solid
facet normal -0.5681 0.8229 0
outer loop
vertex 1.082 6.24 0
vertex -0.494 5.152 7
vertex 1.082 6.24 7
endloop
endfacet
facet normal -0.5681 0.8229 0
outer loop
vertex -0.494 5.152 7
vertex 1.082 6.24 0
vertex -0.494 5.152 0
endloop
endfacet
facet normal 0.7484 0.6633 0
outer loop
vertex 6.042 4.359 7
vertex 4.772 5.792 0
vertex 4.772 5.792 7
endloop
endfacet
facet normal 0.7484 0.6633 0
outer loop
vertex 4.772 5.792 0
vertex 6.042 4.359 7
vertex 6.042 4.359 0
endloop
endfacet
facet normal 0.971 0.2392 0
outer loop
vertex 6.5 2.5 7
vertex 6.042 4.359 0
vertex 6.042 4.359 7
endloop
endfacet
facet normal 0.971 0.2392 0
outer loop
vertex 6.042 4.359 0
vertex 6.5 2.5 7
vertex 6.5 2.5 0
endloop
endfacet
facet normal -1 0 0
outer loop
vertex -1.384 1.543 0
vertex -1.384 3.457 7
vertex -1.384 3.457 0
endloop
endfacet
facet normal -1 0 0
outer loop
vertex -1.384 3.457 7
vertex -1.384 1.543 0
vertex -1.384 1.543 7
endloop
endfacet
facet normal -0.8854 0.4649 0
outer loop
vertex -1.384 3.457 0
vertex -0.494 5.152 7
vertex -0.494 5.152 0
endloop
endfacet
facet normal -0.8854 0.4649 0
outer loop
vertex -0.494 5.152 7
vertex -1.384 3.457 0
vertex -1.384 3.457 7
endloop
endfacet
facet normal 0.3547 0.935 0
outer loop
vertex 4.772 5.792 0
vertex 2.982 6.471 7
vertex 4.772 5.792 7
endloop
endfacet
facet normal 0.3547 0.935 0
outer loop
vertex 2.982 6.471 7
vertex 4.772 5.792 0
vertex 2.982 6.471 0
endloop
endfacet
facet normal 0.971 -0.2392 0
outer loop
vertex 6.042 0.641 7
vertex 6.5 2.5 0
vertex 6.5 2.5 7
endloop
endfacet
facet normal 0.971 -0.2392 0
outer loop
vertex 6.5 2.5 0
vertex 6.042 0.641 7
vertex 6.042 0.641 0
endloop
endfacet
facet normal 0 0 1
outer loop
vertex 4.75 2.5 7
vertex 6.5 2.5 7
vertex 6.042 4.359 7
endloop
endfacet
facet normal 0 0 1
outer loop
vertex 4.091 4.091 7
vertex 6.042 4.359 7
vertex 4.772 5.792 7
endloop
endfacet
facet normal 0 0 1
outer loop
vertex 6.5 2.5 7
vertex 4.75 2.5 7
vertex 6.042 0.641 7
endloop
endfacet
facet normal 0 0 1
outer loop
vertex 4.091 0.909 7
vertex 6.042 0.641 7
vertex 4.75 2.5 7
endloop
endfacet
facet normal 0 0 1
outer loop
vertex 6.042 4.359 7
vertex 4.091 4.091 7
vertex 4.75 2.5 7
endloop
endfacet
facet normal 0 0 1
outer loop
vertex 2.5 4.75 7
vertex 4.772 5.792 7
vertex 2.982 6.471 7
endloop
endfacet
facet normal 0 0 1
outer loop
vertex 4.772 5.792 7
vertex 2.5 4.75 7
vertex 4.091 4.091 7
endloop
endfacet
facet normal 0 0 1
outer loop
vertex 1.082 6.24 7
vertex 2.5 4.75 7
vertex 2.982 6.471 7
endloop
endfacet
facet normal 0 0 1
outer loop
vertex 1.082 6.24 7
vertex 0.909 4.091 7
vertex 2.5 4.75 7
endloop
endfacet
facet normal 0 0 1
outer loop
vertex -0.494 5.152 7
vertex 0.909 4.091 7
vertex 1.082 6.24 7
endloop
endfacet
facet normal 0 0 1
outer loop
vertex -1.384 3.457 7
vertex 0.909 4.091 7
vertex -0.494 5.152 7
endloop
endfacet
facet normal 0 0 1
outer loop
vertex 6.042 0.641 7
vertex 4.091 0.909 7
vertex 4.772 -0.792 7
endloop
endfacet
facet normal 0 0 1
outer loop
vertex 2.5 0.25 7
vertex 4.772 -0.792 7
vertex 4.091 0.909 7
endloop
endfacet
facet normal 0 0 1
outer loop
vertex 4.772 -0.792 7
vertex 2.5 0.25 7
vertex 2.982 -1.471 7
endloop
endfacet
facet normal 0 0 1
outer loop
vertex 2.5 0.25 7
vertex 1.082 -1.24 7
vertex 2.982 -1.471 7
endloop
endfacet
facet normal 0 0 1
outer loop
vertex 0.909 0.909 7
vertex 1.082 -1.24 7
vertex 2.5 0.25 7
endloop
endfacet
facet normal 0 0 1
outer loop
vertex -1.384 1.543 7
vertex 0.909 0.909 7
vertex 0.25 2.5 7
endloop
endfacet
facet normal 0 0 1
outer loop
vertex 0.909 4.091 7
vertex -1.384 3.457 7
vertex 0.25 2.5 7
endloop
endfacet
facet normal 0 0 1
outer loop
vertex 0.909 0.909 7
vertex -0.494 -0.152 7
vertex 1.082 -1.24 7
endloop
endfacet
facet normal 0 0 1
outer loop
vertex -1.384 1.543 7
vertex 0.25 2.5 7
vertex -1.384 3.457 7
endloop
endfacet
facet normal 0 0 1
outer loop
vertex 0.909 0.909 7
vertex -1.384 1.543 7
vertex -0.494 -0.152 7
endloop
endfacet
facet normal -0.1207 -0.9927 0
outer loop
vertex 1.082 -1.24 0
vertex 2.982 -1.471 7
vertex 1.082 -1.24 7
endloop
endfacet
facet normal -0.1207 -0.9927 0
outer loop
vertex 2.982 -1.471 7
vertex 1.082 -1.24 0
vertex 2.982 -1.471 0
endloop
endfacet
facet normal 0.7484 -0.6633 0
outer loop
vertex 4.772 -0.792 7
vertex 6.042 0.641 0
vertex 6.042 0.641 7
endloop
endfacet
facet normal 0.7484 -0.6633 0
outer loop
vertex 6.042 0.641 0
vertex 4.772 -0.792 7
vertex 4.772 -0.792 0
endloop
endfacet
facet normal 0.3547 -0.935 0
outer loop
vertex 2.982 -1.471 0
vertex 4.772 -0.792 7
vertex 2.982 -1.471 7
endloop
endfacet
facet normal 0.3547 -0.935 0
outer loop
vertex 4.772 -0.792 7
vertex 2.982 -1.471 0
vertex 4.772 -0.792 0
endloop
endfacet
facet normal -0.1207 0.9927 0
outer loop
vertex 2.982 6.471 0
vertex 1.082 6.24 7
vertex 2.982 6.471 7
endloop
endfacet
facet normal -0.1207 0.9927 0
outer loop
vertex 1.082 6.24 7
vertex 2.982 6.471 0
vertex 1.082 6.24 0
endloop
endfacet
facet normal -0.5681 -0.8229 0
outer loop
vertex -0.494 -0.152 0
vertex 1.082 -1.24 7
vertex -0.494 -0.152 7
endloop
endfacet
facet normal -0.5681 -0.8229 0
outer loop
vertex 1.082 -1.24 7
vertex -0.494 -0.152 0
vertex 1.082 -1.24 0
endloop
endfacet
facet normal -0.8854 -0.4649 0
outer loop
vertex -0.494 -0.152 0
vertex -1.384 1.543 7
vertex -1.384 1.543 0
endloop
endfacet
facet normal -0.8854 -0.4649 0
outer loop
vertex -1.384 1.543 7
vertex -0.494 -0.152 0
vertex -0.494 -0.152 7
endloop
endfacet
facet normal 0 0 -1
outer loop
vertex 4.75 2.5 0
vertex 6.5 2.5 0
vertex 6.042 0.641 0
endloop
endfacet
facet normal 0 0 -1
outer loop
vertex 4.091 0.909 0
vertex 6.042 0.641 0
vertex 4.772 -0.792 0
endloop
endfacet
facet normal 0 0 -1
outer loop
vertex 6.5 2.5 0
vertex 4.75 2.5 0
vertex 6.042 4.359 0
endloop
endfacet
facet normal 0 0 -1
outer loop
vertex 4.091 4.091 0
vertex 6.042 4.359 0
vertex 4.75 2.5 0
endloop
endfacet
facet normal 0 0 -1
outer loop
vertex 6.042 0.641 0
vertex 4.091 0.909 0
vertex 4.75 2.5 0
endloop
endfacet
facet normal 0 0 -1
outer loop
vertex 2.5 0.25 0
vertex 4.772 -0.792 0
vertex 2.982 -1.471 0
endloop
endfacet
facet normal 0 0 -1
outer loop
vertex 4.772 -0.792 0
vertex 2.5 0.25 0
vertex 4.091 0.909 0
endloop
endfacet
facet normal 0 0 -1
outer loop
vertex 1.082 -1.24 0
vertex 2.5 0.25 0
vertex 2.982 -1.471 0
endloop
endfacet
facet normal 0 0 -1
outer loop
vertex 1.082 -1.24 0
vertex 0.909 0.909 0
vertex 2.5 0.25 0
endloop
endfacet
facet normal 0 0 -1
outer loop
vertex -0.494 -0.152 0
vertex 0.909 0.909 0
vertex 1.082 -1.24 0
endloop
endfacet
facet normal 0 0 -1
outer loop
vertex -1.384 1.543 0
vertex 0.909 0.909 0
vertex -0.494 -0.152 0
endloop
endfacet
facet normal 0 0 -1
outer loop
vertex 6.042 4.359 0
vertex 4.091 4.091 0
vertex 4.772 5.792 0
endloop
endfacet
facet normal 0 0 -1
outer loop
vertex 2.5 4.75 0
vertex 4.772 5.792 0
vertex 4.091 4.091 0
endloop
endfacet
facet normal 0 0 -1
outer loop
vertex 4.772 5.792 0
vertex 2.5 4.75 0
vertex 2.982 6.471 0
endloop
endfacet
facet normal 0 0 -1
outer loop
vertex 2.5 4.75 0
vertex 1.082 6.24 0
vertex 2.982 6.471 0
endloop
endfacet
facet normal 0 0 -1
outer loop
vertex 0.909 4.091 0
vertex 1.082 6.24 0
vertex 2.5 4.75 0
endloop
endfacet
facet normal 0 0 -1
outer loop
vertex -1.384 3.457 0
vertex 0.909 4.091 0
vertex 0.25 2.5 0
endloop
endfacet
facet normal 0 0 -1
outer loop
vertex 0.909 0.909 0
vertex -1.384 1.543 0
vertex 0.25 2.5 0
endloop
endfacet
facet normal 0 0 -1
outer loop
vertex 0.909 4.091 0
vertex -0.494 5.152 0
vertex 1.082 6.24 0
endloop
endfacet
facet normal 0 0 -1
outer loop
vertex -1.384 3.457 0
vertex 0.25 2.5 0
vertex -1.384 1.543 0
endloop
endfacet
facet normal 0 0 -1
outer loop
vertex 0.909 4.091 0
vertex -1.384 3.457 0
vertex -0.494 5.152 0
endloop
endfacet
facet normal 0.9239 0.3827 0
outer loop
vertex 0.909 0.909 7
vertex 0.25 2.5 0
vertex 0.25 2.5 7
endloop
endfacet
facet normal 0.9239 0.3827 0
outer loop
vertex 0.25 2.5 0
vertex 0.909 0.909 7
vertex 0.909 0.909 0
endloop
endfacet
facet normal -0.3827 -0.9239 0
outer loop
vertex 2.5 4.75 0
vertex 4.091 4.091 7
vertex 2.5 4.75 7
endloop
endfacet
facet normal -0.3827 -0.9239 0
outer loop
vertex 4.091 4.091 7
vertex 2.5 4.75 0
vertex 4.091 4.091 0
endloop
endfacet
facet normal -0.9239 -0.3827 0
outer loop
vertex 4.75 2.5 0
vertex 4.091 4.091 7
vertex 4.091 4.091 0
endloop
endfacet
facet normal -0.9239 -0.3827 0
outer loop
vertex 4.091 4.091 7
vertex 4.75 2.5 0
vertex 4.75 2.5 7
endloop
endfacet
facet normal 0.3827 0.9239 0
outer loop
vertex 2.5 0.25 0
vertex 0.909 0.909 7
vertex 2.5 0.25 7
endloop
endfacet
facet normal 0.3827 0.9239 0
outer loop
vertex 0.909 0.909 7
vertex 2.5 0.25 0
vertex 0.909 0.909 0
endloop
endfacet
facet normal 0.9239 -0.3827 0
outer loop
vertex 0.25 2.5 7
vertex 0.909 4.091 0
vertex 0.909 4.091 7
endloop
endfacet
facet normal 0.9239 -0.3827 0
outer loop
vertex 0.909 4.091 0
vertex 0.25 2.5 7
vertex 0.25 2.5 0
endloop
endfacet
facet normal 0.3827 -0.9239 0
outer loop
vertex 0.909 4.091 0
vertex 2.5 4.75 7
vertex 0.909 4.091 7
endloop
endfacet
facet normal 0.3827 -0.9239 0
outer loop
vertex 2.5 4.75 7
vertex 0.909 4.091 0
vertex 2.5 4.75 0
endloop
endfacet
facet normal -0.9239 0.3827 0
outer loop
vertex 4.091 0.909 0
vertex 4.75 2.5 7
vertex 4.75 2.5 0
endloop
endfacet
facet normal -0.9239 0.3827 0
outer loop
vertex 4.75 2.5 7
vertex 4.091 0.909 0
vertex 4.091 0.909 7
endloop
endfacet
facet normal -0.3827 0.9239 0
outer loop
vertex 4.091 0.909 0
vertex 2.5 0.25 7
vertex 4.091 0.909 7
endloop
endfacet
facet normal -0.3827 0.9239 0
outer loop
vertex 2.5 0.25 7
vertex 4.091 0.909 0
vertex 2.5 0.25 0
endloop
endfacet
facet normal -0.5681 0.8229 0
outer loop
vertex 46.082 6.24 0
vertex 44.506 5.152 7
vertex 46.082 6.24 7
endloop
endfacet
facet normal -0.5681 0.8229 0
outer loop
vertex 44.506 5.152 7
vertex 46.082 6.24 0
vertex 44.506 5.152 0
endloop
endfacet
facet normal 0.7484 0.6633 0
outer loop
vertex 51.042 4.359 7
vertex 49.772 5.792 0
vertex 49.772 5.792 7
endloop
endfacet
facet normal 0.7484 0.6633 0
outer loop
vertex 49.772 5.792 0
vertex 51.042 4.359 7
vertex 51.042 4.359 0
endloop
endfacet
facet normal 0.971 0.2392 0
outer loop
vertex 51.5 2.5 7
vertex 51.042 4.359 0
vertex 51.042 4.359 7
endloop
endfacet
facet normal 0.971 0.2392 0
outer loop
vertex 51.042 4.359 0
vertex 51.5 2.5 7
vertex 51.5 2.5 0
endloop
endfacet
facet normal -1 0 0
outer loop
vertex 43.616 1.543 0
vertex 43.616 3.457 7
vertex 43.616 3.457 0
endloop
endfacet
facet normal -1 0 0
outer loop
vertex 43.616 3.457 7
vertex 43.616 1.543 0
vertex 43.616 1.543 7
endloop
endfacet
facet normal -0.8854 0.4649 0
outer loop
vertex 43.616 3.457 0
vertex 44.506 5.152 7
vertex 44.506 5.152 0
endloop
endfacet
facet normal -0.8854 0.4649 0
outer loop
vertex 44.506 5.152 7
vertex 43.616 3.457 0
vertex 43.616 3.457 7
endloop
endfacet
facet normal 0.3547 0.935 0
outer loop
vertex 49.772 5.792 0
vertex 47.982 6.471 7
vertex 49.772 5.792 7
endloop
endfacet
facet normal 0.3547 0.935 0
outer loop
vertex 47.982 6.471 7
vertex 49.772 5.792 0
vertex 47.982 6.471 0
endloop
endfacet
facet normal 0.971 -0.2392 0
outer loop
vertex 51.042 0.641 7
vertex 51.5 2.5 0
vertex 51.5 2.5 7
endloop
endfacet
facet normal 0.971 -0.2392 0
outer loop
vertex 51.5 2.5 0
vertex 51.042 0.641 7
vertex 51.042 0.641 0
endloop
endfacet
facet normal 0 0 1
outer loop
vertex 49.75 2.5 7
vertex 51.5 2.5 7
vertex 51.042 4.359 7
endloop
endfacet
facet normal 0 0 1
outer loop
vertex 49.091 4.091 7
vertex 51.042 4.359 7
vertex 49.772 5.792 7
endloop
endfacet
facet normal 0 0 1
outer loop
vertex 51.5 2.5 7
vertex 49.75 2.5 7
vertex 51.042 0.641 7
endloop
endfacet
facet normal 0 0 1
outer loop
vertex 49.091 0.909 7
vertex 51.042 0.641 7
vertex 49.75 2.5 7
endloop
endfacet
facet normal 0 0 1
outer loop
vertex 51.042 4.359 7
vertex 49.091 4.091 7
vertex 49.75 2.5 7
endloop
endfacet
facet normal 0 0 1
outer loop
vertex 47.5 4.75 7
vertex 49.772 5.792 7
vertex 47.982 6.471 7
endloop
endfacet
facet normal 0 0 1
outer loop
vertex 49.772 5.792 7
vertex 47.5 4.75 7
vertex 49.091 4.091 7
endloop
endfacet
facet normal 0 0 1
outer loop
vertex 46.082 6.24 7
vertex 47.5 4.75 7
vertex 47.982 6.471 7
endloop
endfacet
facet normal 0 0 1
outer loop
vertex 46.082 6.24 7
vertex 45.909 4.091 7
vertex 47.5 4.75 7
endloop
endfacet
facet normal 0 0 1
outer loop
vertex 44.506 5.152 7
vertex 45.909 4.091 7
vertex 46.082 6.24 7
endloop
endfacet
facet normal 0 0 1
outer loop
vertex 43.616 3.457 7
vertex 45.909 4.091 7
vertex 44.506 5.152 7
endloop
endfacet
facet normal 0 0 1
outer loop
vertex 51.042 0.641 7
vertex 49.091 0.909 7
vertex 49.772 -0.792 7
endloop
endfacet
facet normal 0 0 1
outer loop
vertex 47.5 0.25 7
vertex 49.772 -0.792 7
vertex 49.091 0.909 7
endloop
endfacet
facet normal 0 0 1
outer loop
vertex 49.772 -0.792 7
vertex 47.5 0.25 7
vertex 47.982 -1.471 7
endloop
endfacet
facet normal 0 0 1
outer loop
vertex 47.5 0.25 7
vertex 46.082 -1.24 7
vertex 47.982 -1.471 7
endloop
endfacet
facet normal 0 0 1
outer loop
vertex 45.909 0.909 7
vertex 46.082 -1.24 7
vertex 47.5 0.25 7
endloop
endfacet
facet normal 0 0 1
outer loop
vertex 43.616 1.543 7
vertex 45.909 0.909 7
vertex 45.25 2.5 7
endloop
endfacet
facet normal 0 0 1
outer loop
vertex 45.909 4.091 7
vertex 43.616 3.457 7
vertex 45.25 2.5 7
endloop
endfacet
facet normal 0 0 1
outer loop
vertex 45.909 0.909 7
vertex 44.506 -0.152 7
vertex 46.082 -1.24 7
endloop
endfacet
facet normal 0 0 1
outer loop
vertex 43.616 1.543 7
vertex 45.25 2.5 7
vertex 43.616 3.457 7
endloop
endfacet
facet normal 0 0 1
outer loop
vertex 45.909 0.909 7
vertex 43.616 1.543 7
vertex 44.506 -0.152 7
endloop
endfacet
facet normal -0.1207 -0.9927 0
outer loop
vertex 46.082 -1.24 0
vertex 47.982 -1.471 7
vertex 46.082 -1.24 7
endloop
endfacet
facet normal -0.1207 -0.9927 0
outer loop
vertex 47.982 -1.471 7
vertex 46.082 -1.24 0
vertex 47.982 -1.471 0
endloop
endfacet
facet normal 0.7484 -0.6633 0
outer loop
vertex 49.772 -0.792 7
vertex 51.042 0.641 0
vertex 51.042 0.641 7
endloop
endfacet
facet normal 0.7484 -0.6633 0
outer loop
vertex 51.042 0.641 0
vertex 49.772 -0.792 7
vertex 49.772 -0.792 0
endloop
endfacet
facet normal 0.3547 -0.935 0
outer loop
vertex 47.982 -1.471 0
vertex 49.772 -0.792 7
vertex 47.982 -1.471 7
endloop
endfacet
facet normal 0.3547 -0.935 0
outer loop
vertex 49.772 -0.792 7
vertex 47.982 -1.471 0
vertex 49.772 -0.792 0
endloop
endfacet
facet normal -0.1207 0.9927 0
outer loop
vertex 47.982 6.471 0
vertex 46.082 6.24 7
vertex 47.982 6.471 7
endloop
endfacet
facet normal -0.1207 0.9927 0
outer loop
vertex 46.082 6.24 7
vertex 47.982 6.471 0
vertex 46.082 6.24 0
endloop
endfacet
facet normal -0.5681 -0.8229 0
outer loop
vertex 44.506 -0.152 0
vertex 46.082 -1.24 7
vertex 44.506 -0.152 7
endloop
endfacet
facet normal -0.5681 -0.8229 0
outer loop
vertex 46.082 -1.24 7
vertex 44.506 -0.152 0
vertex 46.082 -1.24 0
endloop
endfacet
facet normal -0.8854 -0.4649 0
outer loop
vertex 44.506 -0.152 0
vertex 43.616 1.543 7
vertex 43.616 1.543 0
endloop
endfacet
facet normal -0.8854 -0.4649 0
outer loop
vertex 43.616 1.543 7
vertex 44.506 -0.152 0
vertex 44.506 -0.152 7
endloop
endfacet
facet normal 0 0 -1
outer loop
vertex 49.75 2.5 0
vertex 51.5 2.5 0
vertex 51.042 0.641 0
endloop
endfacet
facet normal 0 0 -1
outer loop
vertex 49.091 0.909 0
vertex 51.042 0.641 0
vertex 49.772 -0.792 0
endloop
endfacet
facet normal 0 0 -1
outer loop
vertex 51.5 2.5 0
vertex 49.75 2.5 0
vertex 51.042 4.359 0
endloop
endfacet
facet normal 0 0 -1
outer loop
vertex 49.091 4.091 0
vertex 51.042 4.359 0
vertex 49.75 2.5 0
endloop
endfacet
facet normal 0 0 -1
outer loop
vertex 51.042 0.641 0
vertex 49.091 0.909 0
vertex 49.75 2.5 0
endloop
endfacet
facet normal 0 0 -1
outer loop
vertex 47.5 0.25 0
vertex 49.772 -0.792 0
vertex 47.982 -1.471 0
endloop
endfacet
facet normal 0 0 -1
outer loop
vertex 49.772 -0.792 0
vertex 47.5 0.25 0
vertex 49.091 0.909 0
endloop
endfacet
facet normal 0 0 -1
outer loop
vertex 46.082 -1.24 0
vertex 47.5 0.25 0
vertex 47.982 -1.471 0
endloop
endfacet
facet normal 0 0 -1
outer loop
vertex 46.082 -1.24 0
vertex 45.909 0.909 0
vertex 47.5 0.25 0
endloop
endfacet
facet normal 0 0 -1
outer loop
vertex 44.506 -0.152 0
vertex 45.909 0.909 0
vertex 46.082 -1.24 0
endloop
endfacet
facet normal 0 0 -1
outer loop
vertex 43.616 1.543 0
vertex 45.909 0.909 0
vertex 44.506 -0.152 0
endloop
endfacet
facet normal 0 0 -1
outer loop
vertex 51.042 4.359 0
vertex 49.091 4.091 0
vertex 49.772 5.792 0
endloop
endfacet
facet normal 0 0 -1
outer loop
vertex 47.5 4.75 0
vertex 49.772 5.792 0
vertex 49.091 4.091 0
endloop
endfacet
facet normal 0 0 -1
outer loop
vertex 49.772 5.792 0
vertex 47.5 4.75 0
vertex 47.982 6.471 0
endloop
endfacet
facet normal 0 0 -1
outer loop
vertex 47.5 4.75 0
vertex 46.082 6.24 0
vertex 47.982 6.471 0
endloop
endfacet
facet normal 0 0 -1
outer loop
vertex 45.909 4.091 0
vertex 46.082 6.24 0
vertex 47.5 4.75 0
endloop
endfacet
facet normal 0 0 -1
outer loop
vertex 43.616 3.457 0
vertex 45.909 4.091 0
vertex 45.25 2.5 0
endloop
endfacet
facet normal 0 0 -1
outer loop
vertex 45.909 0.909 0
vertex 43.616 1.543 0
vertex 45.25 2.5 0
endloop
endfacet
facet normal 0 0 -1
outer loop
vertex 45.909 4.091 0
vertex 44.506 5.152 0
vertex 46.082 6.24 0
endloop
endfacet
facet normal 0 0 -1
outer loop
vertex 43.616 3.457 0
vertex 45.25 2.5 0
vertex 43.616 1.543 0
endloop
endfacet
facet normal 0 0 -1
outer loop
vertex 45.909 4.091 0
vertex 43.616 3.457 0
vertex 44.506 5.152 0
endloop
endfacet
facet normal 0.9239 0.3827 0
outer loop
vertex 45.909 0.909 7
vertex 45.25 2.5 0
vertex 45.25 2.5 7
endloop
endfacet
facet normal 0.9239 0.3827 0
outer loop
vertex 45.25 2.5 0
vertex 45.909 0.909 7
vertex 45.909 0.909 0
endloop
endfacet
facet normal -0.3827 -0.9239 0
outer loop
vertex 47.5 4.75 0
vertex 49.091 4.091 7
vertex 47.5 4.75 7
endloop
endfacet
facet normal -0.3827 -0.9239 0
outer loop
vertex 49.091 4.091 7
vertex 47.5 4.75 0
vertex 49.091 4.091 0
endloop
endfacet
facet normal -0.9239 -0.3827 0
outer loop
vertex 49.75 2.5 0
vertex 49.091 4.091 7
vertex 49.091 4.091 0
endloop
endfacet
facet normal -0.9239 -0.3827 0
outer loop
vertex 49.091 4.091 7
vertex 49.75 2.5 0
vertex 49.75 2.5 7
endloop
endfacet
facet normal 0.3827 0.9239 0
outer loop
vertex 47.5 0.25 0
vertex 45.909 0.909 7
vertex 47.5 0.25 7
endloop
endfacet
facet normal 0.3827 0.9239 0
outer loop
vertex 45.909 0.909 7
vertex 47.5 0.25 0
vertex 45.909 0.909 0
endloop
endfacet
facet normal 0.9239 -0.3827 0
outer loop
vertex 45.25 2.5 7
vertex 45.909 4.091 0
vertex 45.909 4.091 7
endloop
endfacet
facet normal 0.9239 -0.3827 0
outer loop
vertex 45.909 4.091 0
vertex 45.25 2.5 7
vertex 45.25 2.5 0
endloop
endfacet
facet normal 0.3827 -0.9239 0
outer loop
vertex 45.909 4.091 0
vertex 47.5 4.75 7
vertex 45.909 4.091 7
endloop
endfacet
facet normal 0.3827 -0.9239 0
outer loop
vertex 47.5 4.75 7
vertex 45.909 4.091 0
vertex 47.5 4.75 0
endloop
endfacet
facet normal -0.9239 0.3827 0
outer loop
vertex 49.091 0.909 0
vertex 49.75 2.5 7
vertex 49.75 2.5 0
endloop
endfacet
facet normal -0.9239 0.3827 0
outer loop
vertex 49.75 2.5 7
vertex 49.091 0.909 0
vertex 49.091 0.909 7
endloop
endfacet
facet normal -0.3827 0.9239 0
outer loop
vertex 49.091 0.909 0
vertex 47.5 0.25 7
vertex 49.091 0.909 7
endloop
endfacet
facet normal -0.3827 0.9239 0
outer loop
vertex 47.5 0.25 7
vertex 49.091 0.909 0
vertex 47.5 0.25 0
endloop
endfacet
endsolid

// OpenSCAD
module mount(size=8, height=7, hole_depth=7, hole_diameter=4.5)
{
    difference()
    {
        cylinder(h=height, d=size);
        translate([0,0,height-hole_depth]) cylinder(h=hole_depth+0.1, d=hole_diameter);
    };
}

module mobo()
{
    translate([20, 67.5, 0]) mount();
    translate([2, 32.5, 0]) mount();
    translate([34, 29.5, 0]) mount();
    translate([82, 67.5, 0]) mount();
    translate([97, 3, 0]) mount();

    #translate([0,0,8]) square([100,70]);
    #translate([97,0,10]) square([3,70]);
}

module raspberry()
{
    translate([3.5,3.5,0]) mount();
    translate([3.5,52.5,0]) mount();
    translate([61.5,3.5,0]) mount();
    translate([61.5,52.5,0]) mount();

    #translate([0,0,8]) square([85, 56]);
    #translate([82,0,10]) square([3, 56]);
}

module step_down()
{
    translate([36.5,2.5,0]) mount();
    translate([7,18,0]) mount();

    #translate([0,0,8]) square([44, 21]);
}

module relay()
{
    translate([2.5,2.5,0]) mount();
    translate([47.5,2.5,0]) mount();

    #translate([0,0,8]) square([50, 25]);
}

relay();
